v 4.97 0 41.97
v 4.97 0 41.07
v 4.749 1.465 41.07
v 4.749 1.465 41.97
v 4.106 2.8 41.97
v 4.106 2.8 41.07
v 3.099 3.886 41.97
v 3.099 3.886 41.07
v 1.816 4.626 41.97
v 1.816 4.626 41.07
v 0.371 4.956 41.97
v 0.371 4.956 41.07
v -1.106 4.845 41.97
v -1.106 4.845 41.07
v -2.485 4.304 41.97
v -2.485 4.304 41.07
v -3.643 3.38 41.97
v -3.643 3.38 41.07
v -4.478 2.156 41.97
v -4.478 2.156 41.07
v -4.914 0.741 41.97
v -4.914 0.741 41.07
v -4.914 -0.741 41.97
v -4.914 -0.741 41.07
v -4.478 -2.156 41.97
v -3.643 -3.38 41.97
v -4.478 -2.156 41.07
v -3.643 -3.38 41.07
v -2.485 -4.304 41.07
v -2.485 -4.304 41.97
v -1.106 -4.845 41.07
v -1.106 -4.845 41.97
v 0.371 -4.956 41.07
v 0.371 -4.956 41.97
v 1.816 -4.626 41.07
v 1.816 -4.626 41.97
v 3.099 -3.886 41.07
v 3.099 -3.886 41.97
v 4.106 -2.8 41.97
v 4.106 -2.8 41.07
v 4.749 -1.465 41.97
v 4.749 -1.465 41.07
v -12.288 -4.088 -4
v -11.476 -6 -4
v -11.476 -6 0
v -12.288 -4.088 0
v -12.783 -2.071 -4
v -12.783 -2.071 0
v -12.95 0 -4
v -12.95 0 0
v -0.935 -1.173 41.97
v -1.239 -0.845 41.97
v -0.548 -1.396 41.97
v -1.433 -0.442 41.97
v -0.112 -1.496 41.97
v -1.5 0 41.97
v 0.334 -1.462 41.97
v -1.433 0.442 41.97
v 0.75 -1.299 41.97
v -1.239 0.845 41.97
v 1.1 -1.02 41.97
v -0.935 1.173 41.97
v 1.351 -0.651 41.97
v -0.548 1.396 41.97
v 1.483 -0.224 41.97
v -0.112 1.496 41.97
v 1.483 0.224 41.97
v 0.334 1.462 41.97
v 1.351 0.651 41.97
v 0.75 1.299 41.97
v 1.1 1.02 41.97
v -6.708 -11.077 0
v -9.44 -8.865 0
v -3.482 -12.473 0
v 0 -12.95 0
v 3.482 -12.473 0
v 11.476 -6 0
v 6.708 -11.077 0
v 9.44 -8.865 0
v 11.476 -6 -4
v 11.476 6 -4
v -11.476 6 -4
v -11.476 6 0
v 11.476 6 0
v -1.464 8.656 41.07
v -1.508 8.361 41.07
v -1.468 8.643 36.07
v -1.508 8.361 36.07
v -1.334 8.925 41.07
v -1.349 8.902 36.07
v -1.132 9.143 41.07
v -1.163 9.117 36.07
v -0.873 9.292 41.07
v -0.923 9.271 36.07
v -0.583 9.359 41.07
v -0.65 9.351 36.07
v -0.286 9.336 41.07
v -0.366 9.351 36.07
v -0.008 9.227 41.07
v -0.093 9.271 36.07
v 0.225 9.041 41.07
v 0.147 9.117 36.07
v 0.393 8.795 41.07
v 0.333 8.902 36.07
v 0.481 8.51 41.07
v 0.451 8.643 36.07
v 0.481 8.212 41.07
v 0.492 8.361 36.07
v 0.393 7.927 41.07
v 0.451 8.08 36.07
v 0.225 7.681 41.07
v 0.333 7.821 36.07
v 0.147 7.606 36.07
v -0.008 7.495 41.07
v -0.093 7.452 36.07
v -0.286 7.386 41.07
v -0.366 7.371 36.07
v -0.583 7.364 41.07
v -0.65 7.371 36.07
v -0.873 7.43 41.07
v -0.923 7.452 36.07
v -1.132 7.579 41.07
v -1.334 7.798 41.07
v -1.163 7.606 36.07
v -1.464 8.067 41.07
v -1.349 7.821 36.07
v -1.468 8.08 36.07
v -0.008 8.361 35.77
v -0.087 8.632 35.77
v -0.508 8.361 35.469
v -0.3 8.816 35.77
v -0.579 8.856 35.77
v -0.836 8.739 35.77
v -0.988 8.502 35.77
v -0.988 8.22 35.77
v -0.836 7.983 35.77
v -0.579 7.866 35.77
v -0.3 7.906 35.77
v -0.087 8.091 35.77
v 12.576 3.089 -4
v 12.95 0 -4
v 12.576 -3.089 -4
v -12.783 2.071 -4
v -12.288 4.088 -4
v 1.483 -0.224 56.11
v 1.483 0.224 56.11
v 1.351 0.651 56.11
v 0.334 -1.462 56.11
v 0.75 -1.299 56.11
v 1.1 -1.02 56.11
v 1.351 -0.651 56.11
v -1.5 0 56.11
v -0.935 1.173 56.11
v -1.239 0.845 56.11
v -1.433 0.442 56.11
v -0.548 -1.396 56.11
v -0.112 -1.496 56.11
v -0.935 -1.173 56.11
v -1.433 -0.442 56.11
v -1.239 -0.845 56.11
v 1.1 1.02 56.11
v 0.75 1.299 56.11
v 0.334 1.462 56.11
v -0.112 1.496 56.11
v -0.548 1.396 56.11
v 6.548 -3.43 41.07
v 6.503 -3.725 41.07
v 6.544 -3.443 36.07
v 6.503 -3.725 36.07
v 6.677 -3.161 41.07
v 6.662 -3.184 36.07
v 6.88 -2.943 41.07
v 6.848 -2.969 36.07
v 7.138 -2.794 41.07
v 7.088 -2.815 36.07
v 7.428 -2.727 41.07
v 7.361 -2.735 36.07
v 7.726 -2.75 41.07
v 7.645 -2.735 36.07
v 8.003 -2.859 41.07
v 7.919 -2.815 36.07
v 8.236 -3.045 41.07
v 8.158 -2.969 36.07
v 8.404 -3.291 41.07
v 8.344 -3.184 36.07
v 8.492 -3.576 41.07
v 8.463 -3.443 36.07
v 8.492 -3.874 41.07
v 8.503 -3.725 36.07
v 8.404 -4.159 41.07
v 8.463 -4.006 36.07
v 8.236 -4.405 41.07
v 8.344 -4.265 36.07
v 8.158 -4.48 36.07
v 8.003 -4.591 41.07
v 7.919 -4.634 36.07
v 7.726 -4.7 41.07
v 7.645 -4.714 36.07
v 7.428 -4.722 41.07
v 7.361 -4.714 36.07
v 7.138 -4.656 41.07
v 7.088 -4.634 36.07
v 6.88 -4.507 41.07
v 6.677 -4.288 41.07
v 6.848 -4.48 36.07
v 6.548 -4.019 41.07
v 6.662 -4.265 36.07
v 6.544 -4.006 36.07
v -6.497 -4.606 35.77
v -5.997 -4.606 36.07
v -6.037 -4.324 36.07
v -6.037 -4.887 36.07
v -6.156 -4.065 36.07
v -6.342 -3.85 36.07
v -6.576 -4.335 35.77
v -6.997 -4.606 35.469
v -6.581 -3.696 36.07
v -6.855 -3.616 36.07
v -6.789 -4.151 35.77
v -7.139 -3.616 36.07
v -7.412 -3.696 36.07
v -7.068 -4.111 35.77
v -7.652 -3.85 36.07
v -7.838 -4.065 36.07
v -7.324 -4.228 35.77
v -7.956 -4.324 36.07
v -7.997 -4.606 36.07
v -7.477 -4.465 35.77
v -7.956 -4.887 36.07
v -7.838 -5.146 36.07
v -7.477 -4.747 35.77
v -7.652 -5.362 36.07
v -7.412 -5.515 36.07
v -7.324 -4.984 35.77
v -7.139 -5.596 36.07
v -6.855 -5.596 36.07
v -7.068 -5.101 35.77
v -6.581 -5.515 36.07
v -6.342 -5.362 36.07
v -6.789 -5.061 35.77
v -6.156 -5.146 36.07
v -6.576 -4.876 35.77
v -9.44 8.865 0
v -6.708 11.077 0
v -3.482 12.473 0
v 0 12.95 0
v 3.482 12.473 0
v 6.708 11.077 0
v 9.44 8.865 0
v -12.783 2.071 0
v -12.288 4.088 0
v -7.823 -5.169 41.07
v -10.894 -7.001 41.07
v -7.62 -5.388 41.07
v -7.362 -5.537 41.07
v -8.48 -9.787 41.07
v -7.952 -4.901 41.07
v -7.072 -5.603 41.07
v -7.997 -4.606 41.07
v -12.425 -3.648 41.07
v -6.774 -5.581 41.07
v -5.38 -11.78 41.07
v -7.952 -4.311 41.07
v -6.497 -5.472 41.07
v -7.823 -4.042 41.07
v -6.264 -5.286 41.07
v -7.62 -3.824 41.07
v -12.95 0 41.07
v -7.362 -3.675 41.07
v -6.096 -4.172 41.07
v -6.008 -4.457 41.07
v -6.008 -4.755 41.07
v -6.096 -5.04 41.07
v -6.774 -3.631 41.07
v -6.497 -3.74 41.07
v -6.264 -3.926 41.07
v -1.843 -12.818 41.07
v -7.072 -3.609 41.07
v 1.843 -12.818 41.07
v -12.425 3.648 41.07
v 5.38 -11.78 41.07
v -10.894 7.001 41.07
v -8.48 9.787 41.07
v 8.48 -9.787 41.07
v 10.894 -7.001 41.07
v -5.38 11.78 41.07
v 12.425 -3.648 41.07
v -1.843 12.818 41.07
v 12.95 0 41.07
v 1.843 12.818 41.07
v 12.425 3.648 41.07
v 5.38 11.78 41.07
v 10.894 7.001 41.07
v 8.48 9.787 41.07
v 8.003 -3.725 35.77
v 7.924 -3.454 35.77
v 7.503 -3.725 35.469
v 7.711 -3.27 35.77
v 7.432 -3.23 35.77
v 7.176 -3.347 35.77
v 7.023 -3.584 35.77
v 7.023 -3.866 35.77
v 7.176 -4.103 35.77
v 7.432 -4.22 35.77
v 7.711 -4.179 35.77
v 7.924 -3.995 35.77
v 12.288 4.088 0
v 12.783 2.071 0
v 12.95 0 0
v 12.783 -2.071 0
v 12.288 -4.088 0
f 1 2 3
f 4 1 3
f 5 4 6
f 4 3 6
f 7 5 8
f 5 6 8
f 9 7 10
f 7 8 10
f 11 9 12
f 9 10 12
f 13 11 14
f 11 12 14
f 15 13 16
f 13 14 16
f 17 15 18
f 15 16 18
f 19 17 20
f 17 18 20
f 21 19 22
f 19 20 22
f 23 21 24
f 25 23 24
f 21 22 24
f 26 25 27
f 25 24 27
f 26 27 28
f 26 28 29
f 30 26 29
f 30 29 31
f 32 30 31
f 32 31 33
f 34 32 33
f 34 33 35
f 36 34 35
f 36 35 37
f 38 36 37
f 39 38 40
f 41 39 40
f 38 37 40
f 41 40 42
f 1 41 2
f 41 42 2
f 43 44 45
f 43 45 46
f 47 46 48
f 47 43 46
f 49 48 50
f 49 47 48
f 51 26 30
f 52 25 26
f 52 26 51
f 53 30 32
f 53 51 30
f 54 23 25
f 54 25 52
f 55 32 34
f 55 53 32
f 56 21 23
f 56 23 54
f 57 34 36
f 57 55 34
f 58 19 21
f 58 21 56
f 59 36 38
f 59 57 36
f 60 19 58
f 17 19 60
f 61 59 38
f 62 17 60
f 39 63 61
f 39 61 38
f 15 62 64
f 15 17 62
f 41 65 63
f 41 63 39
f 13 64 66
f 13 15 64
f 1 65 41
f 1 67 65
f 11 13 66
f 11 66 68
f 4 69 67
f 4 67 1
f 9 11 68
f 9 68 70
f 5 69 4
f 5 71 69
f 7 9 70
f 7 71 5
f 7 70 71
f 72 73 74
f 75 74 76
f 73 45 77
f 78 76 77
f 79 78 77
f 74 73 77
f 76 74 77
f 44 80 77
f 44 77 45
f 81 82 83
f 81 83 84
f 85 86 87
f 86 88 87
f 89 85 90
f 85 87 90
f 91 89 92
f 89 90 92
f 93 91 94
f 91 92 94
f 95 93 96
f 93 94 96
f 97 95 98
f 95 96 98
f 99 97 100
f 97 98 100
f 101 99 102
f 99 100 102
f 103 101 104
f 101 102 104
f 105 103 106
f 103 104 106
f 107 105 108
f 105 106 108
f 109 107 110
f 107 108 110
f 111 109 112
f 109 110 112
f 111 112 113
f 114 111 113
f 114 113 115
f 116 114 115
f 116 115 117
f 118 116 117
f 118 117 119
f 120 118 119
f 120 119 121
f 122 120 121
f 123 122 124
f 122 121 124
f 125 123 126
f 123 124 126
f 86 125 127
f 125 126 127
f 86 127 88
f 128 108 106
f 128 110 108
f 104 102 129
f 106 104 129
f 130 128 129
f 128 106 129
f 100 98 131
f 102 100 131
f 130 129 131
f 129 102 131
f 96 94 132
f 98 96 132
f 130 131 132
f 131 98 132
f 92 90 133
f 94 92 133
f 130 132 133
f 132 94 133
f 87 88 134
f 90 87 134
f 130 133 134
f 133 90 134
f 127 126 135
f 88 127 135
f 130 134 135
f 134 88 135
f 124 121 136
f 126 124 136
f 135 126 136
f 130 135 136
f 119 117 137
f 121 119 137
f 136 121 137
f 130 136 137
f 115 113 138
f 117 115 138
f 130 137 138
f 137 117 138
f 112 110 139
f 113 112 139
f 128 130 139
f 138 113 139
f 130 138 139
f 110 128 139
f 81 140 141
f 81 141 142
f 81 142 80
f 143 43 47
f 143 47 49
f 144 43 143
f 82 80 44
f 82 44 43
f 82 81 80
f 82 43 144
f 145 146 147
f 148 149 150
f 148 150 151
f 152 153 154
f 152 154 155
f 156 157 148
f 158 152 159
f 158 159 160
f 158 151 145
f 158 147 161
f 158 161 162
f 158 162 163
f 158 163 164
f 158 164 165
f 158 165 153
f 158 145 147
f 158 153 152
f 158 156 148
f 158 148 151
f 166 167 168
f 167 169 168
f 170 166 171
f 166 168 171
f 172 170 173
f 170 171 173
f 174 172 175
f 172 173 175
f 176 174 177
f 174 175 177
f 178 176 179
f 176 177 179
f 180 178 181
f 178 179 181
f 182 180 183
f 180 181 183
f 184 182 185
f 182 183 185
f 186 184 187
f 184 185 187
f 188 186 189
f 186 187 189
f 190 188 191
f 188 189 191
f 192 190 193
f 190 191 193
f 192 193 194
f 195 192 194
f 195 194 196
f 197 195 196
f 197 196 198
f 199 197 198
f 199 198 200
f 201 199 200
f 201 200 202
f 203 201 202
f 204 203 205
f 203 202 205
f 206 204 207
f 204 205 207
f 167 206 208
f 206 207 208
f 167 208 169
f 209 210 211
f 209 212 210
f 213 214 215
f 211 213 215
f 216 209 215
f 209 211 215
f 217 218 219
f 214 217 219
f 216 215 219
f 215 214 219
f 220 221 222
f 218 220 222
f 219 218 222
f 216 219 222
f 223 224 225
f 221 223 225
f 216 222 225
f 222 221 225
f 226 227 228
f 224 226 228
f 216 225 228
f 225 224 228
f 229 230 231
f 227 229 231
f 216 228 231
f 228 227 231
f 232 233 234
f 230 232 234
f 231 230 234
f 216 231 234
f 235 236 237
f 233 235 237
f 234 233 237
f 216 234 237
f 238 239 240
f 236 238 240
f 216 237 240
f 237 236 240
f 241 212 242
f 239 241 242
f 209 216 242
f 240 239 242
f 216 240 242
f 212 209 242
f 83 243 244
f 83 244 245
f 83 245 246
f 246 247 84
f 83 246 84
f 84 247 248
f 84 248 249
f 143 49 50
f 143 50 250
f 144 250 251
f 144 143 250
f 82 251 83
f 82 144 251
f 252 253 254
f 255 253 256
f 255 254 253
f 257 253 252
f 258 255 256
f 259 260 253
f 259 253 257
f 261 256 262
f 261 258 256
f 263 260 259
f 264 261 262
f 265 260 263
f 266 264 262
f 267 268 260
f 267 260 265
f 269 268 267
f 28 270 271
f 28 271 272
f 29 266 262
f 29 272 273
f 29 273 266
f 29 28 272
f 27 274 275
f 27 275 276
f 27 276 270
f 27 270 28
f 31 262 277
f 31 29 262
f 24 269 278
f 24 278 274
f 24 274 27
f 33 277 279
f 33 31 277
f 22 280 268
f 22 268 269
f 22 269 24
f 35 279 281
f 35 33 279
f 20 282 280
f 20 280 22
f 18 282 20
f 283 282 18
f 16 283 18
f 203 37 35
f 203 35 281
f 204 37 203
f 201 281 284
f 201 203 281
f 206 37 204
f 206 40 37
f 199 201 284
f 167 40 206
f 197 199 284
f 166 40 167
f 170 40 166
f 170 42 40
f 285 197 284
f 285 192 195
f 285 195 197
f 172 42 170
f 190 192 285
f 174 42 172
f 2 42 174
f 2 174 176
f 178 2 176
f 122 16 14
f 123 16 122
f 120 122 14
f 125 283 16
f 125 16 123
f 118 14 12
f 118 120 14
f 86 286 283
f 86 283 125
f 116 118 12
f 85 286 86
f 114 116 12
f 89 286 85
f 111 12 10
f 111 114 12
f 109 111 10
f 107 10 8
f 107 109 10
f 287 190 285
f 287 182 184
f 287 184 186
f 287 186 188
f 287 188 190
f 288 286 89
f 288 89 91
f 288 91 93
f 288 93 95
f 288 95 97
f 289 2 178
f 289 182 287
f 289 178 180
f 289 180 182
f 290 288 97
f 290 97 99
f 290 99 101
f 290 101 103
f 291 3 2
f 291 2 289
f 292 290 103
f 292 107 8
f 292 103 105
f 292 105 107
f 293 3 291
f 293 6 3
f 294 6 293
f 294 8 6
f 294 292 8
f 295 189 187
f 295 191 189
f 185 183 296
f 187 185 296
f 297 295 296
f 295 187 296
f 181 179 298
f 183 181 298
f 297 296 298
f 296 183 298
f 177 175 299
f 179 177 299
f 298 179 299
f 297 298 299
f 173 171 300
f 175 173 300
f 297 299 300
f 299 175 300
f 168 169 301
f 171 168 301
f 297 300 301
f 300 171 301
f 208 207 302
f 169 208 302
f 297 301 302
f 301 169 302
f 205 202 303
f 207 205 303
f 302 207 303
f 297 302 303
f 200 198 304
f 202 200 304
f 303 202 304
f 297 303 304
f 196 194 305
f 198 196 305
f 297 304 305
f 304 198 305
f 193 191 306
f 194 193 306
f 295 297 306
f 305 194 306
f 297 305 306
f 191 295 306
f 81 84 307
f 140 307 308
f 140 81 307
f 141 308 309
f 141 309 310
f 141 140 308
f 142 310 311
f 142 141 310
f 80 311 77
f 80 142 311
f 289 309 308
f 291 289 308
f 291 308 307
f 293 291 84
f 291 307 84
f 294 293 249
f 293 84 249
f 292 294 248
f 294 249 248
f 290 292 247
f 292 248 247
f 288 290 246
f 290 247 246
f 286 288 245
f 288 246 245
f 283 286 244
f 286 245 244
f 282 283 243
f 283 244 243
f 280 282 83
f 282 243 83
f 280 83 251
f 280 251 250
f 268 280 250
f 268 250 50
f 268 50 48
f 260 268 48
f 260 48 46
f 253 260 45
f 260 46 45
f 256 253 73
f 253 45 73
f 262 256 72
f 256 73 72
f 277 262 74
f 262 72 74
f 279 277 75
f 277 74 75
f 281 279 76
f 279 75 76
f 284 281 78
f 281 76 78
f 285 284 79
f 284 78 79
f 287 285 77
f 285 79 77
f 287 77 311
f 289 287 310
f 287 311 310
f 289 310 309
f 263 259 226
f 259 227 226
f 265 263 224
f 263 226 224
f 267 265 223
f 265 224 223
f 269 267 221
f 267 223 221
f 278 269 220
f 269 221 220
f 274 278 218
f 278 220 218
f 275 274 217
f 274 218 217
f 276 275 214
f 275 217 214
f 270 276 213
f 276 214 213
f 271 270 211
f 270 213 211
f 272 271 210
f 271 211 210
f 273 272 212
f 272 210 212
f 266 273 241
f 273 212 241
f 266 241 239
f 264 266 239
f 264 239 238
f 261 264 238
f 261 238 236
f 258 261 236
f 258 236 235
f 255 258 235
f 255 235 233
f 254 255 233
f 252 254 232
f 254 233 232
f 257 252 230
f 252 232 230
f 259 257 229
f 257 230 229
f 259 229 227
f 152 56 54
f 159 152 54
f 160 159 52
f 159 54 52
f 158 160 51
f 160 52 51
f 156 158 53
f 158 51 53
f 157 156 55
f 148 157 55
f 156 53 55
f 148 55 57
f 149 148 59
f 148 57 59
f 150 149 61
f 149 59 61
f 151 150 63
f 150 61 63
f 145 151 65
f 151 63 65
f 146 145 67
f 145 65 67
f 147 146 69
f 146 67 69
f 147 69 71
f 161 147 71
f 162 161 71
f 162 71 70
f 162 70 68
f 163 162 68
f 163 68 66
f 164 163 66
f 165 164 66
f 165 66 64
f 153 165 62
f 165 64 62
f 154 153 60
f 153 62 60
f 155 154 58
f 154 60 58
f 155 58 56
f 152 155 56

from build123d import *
from build123d.topology import SkipClean

# Parameters (mm, degrees)
SKETCH1_R                    = 12.95
BOSS_EXTRUDE1_DEPTH          = 41.07
SKETCH2_R                    = 4.97
BOSS_EXTRUDE2_DEPTH          = 0.9
SKETCH3_R                    = 1.5
BOSS_EXTRUDE3_DEPTH          = 14.14
F_2_0_2_DIAMETER_HOLE1_D     = 2
F_2_0_2_DIAMETER_HOLE1_DEPTH = 5
F_2_0_2_DIAMETER_HOLE1_TIP   = 0.600860619
BOSS_EXTRUDE4_START          = 4
BOSS_EXTRUDE4_DEPTH          = 4


with BuildPart() as part:
    # Sketch1 → Boss-Extrude1 (new body)
    with BuildSketch(Plane.XY):
        Circle(SKETCH1_R)
    extrude(amount=BOSS_EXTRUDE1_DEPTH)

    # Sketch2 → Boss-Extrude2 (add)
    with BuildSketch(Plane.XY.offset(41.07)):
        Circle(SKETCH2_R)
    extrude(amount=BOSS_EXTRUDE2_DEPTH)

    # Sketch3 → Boss-Extrude3 (add)
    with BuildSketch(Plane.XY.offset(41.97)):
        with Locations(Location((0, 0, 0), (0, 0, 180))):
            Circle(SKETCH3_R)
    extrude(amount=BOSS_EXTRUDE3_DEPTH)

    # Ø2.0 (2) Diameter Hole1
    with Locations(Plane.XY.offset(41.07)):
        with Locations((-0.508072965, 8.361313231), (7.50309849, -3.724675843), (-6.99690151, -4.60576447)):
            Hole(F_2_0_2_DIAMETER_HOLE1_D / 2, depth=F_2_0_2_DIAMETER_HOLE1_DEPTH)
            with Locations((0, 0, -(F_2_0_2_DIAMETER_HOLE1_DEPTH + F_2_0_2_DIAMETER_HOLE1_TIP / 2))):  # 118° drill point
                Cone(0, F_2_0_2_DIAMETER_HOLE1_D / 2, F_2_0_2_DIAMETER_HOLE1_TIP, mode=Mode.SUBTRACT)

    # Sketch6 → Boss-Extrude4 (add)
    with SkipClean():  # the faces are left unmerged after this step: merging them gives an invalid solid
        with BuildSketch(Plane(origin=(0, 0, 0), x_dir=(-1, 0, 0), z_dir=(0, 0, -1)).offset(BOSS_EXTRUDE4_START)):
            with BuildLine():
                ThreePointArc((-11.476170964, 6), (-12.95, 0), (-11.476170964, -6))
                Line((-11.476170964, -6), (11.476170964, -6))
                ThreePointArc((11.476170964, -6), (12.576146349, -3.089181608), (12.95, 0))
                ThreePointArc((12.95, 0), (12.576146349, 3.089181608), (11.476170964, 6))
                Line((11.476170964, 6), (-11.476170964, 6))
            make_face()
        extrude(amount=-BOSS_EXTRUDE4_DEPTH)


solid = part.part
